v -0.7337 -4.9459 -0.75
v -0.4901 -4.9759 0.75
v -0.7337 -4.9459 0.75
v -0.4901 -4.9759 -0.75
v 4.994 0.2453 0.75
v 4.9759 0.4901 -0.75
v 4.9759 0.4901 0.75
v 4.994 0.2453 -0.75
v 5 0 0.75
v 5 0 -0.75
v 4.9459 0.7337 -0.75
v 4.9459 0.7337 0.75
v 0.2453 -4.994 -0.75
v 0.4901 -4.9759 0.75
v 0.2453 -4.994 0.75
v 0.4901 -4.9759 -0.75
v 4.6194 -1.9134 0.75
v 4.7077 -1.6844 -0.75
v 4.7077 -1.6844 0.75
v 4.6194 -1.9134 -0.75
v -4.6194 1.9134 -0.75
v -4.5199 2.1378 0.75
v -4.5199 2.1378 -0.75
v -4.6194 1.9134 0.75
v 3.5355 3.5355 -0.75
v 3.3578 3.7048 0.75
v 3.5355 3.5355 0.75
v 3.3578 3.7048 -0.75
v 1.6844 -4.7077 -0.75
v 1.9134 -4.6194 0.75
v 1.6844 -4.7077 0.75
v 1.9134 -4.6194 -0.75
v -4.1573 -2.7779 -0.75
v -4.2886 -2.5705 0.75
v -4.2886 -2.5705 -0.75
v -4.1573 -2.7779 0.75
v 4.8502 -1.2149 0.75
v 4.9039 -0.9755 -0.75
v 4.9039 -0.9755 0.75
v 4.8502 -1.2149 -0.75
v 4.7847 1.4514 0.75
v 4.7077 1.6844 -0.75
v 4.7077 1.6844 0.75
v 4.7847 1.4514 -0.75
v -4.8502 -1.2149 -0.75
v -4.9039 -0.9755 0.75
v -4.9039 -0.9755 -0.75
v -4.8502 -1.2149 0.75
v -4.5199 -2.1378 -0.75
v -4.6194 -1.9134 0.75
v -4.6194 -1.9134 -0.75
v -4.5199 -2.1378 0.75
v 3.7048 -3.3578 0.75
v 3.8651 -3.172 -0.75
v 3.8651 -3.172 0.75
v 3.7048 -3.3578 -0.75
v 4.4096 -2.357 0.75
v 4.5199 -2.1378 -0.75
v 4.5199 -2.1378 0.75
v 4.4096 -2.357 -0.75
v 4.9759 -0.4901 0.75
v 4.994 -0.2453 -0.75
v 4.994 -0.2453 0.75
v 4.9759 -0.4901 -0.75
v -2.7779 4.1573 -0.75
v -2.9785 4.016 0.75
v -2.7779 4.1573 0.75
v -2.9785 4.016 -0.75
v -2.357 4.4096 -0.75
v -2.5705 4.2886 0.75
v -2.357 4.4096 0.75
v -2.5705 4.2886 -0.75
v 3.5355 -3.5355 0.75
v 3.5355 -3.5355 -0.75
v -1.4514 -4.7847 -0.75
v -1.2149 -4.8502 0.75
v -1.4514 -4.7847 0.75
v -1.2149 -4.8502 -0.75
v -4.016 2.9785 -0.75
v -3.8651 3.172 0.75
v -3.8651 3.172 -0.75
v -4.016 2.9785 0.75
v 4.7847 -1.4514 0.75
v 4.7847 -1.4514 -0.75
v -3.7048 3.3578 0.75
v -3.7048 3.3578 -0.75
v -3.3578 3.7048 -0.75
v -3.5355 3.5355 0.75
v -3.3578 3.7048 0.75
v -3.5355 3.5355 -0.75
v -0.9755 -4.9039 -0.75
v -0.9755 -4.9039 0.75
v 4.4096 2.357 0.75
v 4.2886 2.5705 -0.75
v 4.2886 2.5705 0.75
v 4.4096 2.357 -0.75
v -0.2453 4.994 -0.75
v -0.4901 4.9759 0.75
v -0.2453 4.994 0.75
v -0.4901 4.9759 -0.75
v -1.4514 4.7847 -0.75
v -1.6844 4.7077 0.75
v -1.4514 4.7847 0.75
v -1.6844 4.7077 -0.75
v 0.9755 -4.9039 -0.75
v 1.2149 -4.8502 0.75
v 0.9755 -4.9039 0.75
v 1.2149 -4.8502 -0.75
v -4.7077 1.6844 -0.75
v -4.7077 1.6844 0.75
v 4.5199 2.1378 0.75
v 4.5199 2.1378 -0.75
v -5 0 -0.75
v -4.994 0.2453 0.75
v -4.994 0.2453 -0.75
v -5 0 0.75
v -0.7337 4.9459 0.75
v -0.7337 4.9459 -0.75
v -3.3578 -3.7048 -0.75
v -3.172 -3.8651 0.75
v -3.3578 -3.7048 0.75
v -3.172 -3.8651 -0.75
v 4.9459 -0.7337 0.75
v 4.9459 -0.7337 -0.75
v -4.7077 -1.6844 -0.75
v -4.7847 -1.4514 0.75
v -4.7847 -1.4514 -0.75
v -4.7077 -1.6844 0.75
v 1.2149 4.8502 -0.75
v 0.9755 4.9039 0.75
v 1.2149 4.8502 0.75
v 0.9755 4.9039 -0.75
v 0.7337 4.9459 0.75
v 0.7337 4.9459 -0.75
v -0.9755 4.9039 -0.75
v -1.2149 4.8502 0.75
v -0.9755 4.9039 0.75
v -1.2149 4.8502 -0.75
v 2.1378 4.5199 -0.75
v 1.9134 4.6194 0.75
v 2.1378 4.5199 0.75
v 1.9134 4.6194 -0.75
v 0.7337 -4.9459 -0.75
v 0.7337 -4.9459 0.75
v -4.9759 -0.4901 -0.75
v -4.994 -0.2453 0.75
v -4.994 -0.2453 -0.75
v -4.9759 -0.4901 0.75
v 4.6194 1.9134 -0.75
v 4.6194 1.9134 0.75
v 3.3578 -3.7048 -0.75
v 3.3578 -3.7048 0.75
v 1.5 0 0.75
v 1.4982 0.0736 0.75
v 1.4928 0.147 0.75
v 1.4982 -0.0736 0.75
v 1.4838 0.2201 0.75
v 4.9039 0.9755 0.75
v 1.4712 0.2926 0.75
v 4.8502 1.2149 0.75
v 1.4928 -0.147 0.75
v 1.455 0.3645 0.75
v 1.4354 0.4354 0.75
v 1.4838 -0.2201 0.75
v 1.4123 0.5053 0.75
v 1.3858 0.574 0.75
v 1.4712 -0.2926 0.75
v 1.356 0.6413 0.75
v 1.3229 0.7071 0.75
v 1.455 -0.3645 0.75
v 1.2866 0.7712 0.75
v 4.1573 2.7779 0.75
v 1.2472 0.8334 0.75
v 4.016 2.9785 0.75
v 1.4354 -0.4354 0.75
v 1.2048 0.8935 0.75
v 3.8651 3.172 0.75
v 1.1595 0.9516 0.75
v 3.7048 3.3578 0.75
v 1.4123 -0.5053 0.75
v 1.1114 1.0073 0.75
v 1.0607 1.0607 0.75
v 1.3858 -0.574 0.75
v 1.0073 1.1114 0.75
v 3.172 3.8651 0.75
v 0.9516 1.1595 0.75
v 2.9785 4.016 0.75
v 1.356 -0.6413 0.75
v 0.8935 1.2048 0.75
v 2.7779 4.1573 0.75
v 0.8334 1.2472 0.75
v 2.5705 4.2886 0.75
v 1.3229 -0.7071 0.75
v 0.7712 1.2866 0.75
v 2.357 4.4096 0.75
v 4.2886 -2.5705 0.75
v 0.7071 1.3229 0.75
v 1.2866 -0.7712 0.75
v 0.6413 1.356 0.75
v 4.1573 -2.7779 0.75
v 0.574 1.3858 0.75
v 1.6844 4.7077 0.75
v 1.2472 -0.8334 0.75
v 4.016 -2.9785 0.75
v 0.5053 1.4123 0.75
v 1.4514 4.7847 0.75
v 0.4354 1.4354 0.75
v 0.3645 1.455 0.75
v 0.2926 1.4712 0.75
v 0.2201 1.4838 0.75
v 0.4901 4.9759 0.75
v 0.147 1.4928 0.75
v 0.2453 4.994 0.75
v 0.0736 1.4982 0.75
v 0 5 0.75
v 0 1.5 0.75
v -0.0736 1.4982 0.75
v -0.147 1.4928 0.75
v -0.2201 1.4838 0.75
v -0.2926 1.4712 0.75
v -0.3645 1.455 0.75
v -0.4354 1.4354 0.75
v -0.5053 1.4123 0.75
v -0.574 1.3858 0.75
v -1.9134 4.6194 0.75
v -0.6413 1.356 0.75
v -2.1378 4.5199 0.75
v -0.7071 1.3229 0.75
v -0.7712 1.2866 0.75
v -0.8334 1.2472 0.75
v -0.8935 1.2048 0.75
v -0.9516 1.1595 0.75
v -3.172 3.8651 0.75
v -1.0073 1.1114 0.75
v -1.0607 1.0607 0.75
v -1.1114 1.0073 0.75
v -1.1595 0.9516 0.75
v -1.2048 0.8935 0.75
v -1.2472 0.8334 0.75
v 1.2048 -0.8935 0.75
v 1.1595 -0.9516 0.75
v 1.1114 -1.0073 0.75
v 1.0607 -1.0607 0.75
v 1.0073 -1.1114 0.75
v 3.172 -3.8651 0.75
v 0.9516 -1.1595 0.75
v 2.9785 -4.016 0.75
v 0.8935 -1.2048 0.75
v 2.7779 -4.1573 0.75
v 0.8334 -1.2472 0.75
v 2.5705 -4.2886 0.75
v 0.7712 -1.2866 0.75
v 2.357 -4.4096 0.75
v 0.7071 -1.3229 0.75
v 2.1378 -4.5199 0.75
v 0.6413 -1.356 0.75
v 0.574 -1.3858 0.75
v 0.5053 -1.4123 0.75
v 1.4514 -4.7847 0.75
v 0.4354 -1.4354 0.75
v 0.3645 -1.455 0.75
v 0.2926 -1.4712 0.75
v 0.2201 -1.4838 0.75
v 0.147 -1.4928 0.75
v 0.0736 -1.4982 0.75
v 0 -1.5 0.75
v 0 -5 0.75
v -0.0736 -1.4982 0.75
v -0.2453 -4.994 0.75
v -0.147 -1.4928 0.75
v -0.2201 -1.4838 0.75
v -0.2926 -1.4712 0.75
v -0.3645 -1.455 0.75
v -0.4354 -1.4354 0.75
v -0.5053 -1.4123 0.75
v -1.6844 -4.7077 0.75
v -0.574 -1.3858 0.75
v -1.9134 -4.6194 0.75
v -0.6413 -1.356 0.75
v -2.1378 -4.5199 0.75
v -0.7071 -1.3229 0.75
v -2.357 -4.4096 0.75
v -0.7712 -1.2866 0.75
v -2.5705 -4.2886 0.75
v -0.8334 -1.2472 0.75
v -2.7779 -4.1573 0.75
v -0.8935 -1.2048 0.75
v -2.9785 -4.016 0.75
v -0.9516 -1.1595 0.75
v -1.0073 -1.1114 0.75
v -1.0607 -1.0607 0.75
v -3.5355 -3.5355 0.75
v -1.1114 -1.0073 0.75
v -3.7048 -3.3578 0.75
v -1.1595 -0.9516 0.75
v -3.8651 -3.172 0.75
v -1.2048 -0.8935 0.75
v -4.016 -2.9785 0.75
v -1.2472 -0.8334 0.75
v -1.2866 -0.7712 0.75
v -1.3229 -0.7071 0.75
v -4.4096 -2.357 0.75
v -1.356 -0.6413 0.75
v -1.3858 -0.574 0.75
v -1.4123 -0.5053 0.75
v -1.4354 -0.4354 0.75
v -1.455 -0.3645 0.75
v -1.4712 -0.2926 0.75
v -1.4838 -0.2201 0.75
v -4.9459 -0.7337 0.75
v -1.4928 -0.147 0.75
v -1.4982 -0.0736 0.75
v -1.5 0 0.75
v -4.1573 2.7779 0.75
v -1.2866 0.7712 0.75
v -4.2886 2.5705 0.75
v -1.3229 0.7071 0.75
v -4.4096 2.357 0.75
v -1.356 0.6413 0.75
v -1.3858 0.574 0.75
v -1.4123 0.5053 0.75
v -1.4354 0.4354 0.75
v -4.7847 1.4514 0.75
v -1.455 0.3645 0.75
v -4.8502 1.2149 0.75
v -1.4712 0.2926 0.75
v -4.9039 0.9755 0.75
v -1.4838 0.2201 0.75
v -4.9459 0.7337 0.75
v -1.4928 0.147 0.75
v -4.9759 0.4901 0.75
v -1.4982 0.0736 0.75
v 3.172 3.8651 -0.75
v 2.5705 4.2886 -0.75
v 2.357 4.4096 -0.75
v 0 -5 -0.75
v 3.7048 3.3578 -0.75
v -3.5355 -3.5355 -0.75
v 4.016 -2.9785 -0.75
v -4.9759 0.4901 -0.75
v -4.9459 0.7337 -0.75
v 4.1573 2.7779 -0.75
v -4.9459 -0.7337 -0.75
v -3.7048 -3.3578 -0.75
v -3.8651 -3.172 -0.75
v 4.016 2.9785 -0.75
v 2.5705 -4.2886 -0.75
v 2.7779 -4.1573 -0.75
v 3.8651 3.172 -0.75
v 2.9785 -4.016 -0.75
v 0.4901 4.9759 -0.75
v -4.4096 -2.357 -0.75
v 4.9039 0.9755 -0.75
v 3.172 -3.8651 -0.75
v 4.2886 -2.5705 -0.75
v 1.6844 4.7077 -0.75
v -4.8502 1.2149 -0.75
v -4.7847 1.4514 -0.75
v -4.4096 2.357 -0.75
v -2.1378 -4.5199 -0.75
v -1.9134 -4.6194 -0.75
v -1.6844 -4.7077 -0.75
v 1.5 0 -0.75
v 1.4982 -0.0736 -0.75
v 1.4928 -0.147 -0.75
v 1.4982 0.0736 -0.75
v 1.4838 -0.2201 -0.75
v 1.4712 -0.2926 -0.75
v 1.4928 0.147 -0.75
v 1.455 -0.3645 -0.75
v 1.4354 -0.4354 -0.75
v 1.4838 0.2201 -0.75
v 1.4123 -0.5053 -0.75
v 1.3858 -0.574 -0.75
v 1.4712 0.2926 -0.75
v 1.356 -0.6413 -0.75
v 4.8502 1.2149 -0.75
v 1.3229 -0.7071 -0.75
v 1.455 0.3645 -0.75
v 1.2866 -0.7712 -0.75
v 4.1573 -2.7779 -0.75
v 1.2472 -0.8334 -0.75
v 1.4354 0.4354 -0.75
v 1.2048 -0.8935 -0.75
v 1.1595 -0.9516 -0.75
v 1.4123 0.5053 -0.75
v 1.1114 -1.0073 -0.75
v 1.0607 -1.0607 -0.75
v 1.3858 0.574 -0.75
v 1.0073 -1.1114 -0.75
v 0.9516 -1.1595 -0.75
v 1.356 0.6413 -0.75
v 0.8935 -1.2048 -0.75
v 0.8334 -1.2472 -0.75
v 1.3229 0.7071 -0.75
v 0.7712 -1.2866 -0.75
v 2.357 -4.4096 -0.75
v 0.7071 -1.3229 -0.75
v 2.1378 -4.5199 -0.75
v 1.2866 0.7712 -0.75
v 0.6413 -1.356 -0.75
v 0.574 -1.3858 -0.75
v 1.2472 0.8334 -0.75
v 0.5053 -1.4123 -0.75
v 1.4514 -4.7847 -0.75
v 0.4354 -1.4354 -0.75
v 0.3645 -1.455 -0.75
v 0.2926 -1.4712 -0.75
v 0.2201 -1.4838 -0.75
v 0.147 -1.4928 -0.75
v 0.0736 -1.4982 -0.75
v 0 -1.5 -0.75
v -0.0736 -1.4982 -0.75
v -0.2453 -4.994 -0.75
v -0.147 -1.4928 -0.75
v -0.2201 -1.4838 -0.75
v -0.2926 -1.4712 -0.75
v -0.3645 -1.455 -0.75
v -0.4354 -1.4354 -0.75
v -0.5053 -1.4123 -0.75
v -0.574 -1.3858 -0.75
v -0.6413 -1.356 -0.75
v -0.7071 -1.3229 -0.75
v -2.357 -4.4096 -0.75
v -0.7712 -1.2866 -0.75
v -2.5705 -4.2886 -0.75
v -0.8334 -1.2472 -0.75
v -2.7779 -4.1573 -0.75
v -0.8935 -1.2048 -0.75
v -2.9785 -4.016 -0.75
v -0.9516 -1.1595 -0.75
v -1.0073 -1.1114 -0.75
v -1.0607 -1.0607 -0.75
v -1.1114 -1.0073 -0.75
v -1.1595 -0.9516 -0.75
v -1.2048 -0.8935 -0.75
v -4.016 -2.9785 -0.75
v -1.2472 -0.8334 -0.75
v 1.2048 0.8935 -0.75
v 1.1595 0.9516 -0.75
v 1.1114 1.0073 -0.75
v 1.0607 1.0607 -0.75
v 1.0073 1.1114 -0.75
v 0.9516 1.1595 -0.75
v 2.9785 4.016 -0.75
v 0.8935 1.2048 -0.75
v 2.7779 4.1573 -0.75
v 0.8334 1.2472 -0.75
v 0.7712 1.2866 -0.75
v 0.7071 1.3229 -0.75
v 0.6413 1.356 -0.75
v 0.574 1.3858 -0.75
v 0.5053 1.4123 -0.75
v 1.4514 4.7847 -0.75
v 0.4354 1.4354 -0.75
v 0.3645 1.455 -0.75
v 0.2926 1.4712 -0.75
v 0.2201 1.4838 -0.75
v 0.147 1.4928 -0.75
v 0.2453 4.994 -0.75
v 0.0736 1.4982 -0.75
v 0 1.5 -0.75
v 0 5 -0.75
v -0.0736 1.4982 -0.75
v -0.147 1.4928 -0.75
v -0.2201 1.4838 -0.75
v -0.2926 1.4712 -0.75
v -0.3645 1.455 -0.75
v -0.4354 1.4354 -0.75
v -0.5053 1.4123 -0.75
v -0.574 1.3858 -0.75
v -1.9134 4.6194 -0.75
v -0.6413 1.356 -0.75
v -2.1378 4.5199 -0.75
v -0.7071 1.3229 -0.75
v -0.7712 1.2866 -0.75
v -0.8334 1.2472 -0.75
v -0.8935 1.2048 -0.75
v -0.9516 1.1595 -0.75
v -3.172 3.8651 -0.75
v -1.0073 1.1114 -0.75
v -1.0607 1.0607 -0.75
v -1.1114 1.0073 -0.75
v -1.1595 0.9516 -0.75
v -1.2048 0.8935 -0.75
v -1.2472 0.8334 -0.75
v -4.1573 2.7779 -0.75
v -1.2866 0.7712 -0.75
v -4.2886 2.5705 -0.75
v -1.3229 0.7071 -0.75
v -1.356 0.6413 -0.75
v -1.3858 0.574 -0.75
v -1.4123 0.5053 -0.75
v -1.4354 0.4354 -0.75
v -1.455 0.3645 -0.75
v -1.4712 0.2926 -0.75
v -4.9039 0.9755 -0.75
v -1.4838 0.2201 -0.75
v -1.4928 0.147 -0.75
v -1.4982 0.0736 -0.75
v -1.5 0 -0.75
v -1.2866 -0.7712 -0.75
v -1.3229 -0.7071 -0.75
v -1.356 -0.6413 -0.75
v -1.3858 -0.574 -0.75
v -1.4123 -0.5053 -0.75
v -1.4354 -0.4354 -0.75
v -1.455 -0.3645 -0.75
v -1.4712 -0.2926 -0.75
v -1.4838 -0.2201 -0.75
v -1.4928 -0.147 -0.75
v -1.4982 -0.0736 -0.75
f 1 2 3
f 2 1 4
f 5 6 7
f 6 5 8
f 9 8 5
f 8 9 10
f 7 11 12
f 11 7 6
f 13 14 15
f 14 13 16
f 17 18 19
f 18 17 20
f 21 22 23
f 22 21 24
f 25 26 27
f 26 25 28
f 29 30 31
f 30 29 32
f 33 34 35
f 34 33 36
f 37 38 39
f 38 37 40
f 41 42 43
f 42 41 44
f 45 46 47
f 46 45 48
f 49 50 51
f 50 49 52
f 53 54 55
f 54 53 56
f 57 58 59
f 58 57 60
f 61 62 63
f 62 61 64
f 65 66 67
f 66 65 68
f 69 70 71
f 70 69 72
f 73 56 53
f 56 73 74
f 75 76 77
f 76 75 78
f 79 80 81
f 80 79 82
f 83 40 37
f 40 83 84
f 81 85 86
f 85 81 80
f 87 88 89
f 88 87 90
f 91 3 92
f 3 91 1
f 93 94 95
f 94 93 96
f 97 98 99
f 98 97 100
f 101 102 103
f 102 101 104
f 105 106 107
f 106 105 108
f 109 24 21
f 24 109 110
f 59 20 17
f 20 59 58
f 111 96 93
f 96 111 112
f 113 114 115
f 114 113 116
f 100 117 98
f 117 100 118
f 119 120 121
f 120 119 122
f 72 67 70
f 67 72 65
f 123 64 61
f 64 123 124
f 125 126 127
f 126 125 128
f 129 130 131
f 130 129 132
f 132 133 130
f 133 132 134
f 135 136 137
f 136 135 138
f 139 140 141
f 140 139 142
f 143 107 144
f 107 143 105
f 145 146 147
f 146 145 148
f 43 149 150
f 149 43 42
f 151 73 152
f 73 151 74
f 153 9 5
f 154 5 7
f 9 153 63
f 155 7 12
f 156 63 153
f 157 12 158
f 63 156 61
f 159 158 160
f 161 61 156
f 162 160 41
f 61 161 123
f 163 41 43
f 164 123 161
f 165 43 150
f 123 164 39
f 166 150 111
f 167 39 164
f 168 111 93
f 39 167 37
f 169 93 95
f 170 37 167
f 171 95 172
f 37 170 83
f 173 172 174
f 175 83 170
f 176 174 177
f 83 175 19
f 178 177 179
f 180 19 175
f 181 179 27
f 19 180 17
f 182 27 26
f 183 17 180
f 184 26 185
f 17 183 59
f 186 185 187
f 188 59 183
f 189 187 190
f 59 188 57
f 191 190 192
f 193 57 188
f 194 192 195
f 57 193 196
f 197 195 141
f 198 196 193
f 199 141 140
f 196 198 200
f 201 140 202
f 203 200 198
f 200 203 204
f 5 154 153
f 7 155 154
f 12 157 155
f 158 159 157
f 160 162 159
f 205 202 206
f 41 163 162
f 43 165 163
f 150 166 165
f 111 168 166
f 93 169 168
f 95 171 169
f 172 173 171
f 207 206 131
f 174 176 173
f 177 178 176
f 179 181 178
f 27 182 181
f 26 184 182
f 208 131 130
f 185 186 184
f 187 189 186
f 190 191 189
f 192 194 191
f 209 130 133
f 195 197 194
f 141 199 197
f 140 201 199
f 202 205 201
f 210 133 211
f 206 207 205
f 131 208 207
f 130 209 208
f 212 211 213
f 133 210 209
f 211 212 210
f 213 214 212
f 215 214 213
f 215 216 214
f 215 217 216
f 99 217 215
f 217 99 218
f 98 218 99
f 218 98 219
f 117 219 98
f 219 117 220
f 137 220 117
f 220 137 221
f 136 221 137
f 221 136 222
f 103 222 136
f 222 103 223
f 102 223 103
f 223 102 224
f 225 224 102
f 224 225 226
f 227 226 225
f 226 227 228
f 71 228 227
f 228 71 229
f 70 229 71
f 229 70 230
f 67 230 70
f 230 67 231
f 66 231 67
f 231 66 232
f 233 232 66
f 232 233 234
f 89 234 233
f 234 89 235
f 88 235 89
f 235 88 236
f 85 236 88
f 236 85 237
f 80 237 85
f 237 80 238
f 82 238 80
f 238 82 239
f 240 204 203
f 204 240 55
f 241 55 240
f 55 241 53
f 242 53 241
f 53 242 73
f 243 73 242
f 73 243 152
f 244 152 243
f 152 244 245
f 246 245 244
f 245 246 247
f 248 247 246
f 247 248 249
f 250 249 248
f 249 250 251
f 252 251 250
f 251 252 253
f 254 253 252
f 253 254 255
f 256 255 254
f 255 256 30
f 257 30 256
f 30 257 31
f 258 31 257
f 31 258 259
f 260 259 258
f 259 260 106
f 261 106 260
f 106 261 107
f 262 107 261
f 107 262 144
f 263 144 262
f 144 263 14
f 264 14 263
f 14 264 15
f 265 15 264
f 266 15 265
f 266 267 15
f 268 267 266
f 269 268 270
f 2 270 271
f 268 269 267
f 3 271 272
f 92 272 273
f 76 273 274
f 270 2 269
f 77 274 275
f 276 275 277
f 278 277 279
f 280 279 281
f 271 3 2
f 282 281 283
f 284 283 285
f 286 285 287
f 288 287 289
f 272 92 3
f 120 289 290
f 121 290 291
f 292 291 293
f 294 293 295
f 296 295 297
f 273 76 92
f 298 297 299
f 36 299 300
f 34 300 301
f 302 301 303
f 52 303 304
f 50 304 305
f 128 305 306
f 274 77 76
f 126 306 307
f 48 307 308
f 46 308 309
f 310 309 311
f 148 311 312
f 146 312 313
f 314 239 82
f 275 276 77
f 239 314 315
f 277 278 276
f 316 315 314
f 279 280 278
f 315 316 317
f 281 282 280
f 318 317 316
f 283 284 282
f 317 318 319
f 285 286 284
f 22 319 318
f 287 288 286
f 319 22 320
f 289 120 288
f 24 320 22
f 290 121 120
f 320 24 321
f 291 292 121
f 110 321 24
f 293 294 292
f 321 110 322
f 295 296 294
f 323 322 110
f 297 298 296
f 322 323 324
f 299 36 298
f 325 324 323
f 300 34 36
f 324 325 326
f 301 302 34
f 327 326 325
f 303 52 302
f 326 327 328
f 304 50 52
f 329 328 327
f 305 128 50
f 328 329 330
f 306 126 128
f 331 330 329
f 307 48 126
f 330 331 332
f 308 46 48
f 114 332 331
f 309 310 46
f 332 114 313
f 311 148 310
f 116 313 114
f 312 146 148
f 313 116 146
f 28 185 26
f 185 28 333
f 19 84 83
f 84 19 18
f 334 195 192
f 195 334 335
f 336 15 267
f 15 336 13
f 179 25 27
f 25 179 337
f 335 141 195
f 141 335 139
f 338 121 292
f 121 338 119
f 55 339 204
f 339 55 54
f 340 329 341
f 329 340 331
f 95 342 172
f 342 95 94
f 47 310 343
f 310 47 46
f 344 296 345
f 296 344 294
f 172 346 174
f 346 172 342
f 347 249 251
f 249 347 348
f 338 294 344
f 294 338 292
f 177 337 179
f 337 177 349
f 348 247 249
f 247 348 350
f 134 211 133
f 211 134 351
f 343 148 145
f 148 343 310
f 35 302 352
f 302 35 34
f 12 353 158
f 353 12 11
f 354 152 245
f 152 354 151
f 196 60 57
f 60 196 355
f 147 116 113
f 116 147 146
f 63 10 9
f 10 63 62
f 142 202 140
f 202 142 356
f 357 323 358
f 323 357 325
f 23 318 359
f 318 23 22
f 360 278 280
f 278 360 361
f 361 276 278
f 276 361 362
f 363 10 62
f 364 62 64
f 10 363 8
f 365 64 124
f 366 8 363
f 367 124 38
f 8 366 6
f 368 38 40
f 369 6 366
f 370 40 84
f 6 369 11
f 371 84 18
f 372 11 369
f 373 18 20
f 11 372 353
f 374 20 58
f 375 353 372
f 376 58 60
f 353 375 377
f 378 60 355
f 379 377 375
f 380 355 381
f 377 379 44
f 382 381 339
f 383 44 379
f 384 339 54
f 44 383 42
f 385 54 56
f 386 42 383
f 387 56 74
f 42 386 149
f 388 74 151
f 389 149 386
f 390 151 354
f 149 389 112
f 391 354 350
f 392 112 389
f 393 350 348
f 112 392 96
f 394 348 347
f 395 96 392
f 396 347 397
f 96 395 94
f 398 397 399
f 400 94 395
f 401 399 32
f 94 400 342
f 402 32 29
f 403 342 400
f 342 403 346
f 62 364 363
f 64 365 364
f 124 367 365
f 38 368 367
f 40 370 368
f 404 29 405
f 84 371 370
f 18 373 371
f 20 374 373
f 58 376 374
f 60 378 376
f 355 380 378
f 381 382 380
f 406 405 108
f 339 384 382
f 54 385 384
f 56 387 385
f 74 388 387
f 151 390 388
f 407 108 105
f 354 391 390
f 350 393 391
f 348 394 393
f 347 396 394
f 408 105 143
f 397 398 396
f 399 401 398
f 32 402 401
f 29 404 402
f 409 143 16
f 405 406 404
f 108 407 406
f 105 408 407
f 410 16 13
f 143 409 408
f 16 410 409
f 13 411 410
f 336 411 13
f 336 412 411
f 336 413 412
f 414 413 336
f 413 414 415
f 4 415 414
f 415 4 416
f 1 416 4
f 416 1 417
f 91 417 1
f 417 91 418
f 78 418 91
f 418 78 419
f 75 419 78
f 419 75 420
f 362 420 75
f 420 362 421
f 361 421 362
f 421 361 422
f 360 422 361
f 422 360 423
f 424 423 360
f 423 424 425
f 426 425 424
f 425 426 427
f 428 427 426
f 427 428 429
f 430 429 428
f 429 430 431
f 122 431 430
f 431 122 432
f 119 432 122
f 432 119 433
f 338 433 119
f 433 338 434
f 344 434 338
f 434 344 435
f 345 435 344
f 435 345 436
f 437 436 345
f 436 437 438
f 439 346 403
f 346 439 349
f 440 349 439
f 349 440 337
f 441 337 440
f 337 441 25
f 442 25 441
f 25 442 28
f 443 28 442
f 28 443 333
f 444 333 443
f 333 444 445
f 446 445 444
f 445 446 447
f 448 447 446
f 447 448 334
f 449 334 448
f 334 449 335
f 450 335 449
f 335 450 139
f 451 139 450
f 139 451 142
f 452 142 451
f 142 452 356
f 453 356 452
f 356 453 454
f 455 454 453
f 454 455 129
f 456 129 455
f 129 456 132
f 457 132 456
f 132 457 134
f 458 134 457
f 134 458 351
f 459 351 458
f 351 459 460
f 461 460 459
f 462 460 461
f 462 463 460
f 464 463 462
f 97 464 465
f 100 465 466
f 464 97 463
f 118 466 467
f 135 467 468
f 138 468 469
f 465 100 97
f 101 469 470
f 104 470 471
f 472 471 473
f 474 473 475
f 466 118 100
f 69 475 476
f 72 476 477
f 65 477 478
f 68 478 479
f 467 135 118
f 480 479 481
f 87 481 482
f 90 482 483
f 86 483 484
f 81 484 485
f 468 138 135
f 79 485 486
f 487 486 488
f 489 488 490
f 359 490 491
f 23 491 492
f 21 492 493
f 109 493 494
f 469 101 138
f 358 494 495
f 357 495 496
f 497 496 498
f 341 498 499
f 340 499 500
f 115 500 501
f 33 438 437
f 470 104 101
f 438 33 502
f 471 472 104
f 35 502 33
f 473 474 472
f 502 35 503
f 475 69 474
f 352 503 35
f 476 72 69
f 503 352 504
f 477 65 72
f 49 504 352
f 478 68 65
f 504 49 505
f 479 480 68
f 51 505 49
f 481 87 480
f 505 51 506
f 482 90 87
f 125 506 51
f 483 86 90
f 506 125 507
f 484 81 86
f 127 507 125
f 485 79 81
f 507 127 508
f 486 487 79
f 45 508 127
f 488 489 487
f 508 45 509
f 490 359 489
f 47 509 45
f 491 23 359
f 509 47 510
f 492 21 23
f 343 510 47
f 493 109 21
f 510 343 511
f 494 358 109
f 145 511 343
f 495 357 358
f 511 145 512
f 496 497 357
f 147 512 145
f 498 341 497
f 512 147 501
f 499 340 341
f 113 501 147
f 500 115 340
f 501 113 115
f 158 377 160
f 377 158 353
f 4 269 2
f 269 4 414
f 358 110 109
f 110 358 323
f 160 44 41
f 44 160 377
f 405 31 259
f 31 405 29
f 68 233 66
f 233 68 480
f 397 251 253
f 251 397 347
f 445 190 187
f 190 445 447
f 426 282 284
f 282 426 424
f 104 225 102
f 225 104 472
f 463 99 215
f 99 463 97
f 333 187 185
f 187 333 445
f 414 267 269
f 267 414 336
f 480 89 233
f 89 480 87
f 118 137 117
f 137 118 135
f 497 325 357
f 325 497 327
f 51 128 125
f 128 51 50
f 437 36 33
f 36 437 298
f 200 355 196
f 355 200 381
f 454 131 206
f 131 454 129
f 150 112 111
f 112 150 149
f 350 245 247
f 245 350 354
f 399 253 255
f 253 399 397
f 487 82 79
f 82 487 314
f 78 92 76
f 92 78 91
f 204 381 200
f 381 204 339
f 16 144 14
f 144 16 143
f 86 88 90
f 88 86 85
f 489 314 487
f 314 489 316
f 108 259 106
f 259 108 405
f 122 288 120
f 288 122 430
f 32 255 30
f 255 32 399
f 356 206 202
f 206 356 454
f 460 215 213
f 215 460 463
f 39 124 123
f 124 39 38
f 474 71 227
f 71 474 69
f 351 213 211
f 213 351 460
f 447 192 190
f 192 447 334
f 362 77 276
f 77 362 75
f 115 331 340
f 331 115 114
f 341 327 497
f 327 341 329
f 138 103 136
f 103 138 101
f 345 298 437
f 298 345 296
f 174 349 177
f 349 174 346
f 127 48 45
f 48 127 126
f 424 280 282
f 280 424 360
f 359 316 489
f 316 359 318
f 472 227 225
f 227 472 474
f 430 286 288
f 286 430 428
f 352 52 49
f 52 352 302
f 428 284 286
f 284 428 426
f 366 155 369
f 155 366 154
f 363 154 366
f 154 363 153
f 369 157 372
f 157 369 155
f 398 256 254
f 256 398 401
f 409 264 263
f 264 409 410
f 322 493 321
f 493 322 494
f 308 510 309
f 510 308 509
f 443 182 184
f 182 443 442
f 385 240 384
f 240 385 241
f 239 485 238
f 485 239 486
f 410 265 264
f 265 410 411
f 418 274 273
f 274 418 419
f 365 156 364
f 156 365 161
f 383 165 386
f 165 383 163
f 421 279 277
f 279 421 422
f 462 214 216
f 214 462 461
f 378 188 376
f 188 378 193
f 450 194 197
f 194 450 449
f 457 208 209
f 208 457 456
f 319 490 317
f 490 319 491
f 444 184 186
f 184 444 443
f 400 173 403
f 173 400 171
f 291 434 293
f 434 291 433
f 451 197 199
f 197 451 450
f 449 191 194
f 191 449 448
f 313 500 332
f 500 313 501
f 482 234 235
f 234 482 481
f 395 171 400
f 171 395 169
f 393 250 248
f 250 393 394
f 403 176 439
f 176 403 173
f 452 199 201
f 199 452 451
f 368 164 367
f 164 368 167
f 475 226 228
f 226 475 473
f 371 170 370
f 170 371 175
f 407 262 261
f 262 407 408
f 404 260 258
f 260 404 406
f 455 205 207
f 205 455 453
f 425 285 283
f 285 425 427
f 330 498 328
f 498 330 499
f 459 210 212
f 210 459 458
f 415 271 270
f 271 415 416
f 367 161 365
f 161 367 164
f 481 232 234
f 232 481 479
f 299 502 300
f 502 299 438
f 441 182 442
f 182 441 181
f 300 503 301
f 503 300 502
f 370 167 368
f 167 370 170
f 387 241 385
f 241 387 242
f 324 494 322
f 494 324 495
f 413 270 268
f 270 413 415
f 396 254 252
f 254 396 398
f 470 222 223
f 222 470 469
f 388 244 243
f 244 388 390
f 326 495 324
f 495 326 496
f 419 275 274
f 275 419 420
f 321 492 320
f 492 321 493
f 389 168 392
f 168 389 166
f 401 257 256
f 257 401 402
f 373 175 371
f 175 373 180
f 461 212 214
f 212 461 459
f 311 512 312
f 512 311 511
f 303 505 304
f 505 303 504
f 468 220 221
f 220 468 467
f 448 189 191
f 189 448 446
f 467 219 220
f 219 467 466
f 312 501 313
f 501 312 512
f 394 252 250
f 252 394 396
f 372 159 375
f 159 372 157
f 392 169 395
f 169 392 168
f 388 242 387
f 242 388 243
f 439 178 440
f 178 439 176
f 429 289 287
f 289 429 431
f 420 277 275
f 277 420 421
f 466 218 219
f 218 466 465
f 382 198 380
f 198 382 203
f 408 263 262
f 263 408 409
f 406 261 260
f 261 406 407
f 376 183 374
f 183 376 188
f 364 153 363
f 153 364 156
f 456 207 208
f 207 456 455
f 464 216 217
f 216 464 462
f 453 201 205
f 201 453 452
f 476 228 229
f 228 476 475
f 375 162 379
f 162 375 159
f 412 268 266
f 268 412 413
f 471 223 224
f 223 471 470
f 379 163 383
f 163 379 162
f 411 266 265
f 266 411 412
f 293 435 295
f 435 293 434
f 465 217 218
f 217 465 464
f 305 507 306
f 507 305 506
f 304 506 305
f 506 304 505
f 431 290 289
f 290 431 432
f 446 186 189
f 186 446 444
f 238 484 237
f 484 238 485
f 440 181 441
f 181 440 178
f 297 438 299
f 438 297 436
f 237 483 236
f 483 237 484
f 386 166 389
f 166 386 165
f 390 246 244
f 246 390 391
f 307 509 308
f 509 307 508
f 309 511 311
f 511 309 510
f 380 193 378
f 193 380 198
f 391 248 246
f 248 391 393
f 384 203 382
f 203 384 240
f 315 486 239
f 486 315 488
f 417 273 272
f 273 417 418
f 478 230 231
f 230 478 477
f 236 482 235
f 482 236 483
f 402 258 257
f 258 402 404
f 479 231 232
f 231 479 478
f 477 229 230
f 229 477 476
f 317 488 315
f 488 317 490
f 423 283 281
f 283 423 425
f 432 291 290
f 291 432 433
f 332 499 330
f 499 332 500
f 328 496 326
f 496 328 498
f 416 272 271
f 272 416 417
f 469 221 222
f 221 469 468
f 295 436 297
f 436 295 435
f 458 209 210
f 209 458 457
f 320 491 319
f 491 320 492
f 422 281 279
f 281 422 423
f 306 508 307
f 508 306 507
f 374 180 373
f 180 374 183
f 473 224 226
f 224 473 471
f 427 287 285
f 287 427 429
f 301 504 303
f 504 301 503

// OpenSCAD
// Rubber washer: 3.0mm inner hole, 10.0mm outer diameter, 1.5mm thickness

inner_diameter_mm = 3.0;
outer_diameter_mm = 10.0;
thickness_mm      = 1.5;

overlap_mm = 0.2;   // ensures clean through-cut
$fn = 128;

module washer(id, od, h) {
    difference() {
        cylinder(d=od, h=h, center=true);
        cylinder(d=id, h=h + 2*overlap_mm, center=true);
    }
}

color([0.2, 0.2, 0.2])
washer(inner_diameter_mm, outer_diameter_mm, thickness_mm);
